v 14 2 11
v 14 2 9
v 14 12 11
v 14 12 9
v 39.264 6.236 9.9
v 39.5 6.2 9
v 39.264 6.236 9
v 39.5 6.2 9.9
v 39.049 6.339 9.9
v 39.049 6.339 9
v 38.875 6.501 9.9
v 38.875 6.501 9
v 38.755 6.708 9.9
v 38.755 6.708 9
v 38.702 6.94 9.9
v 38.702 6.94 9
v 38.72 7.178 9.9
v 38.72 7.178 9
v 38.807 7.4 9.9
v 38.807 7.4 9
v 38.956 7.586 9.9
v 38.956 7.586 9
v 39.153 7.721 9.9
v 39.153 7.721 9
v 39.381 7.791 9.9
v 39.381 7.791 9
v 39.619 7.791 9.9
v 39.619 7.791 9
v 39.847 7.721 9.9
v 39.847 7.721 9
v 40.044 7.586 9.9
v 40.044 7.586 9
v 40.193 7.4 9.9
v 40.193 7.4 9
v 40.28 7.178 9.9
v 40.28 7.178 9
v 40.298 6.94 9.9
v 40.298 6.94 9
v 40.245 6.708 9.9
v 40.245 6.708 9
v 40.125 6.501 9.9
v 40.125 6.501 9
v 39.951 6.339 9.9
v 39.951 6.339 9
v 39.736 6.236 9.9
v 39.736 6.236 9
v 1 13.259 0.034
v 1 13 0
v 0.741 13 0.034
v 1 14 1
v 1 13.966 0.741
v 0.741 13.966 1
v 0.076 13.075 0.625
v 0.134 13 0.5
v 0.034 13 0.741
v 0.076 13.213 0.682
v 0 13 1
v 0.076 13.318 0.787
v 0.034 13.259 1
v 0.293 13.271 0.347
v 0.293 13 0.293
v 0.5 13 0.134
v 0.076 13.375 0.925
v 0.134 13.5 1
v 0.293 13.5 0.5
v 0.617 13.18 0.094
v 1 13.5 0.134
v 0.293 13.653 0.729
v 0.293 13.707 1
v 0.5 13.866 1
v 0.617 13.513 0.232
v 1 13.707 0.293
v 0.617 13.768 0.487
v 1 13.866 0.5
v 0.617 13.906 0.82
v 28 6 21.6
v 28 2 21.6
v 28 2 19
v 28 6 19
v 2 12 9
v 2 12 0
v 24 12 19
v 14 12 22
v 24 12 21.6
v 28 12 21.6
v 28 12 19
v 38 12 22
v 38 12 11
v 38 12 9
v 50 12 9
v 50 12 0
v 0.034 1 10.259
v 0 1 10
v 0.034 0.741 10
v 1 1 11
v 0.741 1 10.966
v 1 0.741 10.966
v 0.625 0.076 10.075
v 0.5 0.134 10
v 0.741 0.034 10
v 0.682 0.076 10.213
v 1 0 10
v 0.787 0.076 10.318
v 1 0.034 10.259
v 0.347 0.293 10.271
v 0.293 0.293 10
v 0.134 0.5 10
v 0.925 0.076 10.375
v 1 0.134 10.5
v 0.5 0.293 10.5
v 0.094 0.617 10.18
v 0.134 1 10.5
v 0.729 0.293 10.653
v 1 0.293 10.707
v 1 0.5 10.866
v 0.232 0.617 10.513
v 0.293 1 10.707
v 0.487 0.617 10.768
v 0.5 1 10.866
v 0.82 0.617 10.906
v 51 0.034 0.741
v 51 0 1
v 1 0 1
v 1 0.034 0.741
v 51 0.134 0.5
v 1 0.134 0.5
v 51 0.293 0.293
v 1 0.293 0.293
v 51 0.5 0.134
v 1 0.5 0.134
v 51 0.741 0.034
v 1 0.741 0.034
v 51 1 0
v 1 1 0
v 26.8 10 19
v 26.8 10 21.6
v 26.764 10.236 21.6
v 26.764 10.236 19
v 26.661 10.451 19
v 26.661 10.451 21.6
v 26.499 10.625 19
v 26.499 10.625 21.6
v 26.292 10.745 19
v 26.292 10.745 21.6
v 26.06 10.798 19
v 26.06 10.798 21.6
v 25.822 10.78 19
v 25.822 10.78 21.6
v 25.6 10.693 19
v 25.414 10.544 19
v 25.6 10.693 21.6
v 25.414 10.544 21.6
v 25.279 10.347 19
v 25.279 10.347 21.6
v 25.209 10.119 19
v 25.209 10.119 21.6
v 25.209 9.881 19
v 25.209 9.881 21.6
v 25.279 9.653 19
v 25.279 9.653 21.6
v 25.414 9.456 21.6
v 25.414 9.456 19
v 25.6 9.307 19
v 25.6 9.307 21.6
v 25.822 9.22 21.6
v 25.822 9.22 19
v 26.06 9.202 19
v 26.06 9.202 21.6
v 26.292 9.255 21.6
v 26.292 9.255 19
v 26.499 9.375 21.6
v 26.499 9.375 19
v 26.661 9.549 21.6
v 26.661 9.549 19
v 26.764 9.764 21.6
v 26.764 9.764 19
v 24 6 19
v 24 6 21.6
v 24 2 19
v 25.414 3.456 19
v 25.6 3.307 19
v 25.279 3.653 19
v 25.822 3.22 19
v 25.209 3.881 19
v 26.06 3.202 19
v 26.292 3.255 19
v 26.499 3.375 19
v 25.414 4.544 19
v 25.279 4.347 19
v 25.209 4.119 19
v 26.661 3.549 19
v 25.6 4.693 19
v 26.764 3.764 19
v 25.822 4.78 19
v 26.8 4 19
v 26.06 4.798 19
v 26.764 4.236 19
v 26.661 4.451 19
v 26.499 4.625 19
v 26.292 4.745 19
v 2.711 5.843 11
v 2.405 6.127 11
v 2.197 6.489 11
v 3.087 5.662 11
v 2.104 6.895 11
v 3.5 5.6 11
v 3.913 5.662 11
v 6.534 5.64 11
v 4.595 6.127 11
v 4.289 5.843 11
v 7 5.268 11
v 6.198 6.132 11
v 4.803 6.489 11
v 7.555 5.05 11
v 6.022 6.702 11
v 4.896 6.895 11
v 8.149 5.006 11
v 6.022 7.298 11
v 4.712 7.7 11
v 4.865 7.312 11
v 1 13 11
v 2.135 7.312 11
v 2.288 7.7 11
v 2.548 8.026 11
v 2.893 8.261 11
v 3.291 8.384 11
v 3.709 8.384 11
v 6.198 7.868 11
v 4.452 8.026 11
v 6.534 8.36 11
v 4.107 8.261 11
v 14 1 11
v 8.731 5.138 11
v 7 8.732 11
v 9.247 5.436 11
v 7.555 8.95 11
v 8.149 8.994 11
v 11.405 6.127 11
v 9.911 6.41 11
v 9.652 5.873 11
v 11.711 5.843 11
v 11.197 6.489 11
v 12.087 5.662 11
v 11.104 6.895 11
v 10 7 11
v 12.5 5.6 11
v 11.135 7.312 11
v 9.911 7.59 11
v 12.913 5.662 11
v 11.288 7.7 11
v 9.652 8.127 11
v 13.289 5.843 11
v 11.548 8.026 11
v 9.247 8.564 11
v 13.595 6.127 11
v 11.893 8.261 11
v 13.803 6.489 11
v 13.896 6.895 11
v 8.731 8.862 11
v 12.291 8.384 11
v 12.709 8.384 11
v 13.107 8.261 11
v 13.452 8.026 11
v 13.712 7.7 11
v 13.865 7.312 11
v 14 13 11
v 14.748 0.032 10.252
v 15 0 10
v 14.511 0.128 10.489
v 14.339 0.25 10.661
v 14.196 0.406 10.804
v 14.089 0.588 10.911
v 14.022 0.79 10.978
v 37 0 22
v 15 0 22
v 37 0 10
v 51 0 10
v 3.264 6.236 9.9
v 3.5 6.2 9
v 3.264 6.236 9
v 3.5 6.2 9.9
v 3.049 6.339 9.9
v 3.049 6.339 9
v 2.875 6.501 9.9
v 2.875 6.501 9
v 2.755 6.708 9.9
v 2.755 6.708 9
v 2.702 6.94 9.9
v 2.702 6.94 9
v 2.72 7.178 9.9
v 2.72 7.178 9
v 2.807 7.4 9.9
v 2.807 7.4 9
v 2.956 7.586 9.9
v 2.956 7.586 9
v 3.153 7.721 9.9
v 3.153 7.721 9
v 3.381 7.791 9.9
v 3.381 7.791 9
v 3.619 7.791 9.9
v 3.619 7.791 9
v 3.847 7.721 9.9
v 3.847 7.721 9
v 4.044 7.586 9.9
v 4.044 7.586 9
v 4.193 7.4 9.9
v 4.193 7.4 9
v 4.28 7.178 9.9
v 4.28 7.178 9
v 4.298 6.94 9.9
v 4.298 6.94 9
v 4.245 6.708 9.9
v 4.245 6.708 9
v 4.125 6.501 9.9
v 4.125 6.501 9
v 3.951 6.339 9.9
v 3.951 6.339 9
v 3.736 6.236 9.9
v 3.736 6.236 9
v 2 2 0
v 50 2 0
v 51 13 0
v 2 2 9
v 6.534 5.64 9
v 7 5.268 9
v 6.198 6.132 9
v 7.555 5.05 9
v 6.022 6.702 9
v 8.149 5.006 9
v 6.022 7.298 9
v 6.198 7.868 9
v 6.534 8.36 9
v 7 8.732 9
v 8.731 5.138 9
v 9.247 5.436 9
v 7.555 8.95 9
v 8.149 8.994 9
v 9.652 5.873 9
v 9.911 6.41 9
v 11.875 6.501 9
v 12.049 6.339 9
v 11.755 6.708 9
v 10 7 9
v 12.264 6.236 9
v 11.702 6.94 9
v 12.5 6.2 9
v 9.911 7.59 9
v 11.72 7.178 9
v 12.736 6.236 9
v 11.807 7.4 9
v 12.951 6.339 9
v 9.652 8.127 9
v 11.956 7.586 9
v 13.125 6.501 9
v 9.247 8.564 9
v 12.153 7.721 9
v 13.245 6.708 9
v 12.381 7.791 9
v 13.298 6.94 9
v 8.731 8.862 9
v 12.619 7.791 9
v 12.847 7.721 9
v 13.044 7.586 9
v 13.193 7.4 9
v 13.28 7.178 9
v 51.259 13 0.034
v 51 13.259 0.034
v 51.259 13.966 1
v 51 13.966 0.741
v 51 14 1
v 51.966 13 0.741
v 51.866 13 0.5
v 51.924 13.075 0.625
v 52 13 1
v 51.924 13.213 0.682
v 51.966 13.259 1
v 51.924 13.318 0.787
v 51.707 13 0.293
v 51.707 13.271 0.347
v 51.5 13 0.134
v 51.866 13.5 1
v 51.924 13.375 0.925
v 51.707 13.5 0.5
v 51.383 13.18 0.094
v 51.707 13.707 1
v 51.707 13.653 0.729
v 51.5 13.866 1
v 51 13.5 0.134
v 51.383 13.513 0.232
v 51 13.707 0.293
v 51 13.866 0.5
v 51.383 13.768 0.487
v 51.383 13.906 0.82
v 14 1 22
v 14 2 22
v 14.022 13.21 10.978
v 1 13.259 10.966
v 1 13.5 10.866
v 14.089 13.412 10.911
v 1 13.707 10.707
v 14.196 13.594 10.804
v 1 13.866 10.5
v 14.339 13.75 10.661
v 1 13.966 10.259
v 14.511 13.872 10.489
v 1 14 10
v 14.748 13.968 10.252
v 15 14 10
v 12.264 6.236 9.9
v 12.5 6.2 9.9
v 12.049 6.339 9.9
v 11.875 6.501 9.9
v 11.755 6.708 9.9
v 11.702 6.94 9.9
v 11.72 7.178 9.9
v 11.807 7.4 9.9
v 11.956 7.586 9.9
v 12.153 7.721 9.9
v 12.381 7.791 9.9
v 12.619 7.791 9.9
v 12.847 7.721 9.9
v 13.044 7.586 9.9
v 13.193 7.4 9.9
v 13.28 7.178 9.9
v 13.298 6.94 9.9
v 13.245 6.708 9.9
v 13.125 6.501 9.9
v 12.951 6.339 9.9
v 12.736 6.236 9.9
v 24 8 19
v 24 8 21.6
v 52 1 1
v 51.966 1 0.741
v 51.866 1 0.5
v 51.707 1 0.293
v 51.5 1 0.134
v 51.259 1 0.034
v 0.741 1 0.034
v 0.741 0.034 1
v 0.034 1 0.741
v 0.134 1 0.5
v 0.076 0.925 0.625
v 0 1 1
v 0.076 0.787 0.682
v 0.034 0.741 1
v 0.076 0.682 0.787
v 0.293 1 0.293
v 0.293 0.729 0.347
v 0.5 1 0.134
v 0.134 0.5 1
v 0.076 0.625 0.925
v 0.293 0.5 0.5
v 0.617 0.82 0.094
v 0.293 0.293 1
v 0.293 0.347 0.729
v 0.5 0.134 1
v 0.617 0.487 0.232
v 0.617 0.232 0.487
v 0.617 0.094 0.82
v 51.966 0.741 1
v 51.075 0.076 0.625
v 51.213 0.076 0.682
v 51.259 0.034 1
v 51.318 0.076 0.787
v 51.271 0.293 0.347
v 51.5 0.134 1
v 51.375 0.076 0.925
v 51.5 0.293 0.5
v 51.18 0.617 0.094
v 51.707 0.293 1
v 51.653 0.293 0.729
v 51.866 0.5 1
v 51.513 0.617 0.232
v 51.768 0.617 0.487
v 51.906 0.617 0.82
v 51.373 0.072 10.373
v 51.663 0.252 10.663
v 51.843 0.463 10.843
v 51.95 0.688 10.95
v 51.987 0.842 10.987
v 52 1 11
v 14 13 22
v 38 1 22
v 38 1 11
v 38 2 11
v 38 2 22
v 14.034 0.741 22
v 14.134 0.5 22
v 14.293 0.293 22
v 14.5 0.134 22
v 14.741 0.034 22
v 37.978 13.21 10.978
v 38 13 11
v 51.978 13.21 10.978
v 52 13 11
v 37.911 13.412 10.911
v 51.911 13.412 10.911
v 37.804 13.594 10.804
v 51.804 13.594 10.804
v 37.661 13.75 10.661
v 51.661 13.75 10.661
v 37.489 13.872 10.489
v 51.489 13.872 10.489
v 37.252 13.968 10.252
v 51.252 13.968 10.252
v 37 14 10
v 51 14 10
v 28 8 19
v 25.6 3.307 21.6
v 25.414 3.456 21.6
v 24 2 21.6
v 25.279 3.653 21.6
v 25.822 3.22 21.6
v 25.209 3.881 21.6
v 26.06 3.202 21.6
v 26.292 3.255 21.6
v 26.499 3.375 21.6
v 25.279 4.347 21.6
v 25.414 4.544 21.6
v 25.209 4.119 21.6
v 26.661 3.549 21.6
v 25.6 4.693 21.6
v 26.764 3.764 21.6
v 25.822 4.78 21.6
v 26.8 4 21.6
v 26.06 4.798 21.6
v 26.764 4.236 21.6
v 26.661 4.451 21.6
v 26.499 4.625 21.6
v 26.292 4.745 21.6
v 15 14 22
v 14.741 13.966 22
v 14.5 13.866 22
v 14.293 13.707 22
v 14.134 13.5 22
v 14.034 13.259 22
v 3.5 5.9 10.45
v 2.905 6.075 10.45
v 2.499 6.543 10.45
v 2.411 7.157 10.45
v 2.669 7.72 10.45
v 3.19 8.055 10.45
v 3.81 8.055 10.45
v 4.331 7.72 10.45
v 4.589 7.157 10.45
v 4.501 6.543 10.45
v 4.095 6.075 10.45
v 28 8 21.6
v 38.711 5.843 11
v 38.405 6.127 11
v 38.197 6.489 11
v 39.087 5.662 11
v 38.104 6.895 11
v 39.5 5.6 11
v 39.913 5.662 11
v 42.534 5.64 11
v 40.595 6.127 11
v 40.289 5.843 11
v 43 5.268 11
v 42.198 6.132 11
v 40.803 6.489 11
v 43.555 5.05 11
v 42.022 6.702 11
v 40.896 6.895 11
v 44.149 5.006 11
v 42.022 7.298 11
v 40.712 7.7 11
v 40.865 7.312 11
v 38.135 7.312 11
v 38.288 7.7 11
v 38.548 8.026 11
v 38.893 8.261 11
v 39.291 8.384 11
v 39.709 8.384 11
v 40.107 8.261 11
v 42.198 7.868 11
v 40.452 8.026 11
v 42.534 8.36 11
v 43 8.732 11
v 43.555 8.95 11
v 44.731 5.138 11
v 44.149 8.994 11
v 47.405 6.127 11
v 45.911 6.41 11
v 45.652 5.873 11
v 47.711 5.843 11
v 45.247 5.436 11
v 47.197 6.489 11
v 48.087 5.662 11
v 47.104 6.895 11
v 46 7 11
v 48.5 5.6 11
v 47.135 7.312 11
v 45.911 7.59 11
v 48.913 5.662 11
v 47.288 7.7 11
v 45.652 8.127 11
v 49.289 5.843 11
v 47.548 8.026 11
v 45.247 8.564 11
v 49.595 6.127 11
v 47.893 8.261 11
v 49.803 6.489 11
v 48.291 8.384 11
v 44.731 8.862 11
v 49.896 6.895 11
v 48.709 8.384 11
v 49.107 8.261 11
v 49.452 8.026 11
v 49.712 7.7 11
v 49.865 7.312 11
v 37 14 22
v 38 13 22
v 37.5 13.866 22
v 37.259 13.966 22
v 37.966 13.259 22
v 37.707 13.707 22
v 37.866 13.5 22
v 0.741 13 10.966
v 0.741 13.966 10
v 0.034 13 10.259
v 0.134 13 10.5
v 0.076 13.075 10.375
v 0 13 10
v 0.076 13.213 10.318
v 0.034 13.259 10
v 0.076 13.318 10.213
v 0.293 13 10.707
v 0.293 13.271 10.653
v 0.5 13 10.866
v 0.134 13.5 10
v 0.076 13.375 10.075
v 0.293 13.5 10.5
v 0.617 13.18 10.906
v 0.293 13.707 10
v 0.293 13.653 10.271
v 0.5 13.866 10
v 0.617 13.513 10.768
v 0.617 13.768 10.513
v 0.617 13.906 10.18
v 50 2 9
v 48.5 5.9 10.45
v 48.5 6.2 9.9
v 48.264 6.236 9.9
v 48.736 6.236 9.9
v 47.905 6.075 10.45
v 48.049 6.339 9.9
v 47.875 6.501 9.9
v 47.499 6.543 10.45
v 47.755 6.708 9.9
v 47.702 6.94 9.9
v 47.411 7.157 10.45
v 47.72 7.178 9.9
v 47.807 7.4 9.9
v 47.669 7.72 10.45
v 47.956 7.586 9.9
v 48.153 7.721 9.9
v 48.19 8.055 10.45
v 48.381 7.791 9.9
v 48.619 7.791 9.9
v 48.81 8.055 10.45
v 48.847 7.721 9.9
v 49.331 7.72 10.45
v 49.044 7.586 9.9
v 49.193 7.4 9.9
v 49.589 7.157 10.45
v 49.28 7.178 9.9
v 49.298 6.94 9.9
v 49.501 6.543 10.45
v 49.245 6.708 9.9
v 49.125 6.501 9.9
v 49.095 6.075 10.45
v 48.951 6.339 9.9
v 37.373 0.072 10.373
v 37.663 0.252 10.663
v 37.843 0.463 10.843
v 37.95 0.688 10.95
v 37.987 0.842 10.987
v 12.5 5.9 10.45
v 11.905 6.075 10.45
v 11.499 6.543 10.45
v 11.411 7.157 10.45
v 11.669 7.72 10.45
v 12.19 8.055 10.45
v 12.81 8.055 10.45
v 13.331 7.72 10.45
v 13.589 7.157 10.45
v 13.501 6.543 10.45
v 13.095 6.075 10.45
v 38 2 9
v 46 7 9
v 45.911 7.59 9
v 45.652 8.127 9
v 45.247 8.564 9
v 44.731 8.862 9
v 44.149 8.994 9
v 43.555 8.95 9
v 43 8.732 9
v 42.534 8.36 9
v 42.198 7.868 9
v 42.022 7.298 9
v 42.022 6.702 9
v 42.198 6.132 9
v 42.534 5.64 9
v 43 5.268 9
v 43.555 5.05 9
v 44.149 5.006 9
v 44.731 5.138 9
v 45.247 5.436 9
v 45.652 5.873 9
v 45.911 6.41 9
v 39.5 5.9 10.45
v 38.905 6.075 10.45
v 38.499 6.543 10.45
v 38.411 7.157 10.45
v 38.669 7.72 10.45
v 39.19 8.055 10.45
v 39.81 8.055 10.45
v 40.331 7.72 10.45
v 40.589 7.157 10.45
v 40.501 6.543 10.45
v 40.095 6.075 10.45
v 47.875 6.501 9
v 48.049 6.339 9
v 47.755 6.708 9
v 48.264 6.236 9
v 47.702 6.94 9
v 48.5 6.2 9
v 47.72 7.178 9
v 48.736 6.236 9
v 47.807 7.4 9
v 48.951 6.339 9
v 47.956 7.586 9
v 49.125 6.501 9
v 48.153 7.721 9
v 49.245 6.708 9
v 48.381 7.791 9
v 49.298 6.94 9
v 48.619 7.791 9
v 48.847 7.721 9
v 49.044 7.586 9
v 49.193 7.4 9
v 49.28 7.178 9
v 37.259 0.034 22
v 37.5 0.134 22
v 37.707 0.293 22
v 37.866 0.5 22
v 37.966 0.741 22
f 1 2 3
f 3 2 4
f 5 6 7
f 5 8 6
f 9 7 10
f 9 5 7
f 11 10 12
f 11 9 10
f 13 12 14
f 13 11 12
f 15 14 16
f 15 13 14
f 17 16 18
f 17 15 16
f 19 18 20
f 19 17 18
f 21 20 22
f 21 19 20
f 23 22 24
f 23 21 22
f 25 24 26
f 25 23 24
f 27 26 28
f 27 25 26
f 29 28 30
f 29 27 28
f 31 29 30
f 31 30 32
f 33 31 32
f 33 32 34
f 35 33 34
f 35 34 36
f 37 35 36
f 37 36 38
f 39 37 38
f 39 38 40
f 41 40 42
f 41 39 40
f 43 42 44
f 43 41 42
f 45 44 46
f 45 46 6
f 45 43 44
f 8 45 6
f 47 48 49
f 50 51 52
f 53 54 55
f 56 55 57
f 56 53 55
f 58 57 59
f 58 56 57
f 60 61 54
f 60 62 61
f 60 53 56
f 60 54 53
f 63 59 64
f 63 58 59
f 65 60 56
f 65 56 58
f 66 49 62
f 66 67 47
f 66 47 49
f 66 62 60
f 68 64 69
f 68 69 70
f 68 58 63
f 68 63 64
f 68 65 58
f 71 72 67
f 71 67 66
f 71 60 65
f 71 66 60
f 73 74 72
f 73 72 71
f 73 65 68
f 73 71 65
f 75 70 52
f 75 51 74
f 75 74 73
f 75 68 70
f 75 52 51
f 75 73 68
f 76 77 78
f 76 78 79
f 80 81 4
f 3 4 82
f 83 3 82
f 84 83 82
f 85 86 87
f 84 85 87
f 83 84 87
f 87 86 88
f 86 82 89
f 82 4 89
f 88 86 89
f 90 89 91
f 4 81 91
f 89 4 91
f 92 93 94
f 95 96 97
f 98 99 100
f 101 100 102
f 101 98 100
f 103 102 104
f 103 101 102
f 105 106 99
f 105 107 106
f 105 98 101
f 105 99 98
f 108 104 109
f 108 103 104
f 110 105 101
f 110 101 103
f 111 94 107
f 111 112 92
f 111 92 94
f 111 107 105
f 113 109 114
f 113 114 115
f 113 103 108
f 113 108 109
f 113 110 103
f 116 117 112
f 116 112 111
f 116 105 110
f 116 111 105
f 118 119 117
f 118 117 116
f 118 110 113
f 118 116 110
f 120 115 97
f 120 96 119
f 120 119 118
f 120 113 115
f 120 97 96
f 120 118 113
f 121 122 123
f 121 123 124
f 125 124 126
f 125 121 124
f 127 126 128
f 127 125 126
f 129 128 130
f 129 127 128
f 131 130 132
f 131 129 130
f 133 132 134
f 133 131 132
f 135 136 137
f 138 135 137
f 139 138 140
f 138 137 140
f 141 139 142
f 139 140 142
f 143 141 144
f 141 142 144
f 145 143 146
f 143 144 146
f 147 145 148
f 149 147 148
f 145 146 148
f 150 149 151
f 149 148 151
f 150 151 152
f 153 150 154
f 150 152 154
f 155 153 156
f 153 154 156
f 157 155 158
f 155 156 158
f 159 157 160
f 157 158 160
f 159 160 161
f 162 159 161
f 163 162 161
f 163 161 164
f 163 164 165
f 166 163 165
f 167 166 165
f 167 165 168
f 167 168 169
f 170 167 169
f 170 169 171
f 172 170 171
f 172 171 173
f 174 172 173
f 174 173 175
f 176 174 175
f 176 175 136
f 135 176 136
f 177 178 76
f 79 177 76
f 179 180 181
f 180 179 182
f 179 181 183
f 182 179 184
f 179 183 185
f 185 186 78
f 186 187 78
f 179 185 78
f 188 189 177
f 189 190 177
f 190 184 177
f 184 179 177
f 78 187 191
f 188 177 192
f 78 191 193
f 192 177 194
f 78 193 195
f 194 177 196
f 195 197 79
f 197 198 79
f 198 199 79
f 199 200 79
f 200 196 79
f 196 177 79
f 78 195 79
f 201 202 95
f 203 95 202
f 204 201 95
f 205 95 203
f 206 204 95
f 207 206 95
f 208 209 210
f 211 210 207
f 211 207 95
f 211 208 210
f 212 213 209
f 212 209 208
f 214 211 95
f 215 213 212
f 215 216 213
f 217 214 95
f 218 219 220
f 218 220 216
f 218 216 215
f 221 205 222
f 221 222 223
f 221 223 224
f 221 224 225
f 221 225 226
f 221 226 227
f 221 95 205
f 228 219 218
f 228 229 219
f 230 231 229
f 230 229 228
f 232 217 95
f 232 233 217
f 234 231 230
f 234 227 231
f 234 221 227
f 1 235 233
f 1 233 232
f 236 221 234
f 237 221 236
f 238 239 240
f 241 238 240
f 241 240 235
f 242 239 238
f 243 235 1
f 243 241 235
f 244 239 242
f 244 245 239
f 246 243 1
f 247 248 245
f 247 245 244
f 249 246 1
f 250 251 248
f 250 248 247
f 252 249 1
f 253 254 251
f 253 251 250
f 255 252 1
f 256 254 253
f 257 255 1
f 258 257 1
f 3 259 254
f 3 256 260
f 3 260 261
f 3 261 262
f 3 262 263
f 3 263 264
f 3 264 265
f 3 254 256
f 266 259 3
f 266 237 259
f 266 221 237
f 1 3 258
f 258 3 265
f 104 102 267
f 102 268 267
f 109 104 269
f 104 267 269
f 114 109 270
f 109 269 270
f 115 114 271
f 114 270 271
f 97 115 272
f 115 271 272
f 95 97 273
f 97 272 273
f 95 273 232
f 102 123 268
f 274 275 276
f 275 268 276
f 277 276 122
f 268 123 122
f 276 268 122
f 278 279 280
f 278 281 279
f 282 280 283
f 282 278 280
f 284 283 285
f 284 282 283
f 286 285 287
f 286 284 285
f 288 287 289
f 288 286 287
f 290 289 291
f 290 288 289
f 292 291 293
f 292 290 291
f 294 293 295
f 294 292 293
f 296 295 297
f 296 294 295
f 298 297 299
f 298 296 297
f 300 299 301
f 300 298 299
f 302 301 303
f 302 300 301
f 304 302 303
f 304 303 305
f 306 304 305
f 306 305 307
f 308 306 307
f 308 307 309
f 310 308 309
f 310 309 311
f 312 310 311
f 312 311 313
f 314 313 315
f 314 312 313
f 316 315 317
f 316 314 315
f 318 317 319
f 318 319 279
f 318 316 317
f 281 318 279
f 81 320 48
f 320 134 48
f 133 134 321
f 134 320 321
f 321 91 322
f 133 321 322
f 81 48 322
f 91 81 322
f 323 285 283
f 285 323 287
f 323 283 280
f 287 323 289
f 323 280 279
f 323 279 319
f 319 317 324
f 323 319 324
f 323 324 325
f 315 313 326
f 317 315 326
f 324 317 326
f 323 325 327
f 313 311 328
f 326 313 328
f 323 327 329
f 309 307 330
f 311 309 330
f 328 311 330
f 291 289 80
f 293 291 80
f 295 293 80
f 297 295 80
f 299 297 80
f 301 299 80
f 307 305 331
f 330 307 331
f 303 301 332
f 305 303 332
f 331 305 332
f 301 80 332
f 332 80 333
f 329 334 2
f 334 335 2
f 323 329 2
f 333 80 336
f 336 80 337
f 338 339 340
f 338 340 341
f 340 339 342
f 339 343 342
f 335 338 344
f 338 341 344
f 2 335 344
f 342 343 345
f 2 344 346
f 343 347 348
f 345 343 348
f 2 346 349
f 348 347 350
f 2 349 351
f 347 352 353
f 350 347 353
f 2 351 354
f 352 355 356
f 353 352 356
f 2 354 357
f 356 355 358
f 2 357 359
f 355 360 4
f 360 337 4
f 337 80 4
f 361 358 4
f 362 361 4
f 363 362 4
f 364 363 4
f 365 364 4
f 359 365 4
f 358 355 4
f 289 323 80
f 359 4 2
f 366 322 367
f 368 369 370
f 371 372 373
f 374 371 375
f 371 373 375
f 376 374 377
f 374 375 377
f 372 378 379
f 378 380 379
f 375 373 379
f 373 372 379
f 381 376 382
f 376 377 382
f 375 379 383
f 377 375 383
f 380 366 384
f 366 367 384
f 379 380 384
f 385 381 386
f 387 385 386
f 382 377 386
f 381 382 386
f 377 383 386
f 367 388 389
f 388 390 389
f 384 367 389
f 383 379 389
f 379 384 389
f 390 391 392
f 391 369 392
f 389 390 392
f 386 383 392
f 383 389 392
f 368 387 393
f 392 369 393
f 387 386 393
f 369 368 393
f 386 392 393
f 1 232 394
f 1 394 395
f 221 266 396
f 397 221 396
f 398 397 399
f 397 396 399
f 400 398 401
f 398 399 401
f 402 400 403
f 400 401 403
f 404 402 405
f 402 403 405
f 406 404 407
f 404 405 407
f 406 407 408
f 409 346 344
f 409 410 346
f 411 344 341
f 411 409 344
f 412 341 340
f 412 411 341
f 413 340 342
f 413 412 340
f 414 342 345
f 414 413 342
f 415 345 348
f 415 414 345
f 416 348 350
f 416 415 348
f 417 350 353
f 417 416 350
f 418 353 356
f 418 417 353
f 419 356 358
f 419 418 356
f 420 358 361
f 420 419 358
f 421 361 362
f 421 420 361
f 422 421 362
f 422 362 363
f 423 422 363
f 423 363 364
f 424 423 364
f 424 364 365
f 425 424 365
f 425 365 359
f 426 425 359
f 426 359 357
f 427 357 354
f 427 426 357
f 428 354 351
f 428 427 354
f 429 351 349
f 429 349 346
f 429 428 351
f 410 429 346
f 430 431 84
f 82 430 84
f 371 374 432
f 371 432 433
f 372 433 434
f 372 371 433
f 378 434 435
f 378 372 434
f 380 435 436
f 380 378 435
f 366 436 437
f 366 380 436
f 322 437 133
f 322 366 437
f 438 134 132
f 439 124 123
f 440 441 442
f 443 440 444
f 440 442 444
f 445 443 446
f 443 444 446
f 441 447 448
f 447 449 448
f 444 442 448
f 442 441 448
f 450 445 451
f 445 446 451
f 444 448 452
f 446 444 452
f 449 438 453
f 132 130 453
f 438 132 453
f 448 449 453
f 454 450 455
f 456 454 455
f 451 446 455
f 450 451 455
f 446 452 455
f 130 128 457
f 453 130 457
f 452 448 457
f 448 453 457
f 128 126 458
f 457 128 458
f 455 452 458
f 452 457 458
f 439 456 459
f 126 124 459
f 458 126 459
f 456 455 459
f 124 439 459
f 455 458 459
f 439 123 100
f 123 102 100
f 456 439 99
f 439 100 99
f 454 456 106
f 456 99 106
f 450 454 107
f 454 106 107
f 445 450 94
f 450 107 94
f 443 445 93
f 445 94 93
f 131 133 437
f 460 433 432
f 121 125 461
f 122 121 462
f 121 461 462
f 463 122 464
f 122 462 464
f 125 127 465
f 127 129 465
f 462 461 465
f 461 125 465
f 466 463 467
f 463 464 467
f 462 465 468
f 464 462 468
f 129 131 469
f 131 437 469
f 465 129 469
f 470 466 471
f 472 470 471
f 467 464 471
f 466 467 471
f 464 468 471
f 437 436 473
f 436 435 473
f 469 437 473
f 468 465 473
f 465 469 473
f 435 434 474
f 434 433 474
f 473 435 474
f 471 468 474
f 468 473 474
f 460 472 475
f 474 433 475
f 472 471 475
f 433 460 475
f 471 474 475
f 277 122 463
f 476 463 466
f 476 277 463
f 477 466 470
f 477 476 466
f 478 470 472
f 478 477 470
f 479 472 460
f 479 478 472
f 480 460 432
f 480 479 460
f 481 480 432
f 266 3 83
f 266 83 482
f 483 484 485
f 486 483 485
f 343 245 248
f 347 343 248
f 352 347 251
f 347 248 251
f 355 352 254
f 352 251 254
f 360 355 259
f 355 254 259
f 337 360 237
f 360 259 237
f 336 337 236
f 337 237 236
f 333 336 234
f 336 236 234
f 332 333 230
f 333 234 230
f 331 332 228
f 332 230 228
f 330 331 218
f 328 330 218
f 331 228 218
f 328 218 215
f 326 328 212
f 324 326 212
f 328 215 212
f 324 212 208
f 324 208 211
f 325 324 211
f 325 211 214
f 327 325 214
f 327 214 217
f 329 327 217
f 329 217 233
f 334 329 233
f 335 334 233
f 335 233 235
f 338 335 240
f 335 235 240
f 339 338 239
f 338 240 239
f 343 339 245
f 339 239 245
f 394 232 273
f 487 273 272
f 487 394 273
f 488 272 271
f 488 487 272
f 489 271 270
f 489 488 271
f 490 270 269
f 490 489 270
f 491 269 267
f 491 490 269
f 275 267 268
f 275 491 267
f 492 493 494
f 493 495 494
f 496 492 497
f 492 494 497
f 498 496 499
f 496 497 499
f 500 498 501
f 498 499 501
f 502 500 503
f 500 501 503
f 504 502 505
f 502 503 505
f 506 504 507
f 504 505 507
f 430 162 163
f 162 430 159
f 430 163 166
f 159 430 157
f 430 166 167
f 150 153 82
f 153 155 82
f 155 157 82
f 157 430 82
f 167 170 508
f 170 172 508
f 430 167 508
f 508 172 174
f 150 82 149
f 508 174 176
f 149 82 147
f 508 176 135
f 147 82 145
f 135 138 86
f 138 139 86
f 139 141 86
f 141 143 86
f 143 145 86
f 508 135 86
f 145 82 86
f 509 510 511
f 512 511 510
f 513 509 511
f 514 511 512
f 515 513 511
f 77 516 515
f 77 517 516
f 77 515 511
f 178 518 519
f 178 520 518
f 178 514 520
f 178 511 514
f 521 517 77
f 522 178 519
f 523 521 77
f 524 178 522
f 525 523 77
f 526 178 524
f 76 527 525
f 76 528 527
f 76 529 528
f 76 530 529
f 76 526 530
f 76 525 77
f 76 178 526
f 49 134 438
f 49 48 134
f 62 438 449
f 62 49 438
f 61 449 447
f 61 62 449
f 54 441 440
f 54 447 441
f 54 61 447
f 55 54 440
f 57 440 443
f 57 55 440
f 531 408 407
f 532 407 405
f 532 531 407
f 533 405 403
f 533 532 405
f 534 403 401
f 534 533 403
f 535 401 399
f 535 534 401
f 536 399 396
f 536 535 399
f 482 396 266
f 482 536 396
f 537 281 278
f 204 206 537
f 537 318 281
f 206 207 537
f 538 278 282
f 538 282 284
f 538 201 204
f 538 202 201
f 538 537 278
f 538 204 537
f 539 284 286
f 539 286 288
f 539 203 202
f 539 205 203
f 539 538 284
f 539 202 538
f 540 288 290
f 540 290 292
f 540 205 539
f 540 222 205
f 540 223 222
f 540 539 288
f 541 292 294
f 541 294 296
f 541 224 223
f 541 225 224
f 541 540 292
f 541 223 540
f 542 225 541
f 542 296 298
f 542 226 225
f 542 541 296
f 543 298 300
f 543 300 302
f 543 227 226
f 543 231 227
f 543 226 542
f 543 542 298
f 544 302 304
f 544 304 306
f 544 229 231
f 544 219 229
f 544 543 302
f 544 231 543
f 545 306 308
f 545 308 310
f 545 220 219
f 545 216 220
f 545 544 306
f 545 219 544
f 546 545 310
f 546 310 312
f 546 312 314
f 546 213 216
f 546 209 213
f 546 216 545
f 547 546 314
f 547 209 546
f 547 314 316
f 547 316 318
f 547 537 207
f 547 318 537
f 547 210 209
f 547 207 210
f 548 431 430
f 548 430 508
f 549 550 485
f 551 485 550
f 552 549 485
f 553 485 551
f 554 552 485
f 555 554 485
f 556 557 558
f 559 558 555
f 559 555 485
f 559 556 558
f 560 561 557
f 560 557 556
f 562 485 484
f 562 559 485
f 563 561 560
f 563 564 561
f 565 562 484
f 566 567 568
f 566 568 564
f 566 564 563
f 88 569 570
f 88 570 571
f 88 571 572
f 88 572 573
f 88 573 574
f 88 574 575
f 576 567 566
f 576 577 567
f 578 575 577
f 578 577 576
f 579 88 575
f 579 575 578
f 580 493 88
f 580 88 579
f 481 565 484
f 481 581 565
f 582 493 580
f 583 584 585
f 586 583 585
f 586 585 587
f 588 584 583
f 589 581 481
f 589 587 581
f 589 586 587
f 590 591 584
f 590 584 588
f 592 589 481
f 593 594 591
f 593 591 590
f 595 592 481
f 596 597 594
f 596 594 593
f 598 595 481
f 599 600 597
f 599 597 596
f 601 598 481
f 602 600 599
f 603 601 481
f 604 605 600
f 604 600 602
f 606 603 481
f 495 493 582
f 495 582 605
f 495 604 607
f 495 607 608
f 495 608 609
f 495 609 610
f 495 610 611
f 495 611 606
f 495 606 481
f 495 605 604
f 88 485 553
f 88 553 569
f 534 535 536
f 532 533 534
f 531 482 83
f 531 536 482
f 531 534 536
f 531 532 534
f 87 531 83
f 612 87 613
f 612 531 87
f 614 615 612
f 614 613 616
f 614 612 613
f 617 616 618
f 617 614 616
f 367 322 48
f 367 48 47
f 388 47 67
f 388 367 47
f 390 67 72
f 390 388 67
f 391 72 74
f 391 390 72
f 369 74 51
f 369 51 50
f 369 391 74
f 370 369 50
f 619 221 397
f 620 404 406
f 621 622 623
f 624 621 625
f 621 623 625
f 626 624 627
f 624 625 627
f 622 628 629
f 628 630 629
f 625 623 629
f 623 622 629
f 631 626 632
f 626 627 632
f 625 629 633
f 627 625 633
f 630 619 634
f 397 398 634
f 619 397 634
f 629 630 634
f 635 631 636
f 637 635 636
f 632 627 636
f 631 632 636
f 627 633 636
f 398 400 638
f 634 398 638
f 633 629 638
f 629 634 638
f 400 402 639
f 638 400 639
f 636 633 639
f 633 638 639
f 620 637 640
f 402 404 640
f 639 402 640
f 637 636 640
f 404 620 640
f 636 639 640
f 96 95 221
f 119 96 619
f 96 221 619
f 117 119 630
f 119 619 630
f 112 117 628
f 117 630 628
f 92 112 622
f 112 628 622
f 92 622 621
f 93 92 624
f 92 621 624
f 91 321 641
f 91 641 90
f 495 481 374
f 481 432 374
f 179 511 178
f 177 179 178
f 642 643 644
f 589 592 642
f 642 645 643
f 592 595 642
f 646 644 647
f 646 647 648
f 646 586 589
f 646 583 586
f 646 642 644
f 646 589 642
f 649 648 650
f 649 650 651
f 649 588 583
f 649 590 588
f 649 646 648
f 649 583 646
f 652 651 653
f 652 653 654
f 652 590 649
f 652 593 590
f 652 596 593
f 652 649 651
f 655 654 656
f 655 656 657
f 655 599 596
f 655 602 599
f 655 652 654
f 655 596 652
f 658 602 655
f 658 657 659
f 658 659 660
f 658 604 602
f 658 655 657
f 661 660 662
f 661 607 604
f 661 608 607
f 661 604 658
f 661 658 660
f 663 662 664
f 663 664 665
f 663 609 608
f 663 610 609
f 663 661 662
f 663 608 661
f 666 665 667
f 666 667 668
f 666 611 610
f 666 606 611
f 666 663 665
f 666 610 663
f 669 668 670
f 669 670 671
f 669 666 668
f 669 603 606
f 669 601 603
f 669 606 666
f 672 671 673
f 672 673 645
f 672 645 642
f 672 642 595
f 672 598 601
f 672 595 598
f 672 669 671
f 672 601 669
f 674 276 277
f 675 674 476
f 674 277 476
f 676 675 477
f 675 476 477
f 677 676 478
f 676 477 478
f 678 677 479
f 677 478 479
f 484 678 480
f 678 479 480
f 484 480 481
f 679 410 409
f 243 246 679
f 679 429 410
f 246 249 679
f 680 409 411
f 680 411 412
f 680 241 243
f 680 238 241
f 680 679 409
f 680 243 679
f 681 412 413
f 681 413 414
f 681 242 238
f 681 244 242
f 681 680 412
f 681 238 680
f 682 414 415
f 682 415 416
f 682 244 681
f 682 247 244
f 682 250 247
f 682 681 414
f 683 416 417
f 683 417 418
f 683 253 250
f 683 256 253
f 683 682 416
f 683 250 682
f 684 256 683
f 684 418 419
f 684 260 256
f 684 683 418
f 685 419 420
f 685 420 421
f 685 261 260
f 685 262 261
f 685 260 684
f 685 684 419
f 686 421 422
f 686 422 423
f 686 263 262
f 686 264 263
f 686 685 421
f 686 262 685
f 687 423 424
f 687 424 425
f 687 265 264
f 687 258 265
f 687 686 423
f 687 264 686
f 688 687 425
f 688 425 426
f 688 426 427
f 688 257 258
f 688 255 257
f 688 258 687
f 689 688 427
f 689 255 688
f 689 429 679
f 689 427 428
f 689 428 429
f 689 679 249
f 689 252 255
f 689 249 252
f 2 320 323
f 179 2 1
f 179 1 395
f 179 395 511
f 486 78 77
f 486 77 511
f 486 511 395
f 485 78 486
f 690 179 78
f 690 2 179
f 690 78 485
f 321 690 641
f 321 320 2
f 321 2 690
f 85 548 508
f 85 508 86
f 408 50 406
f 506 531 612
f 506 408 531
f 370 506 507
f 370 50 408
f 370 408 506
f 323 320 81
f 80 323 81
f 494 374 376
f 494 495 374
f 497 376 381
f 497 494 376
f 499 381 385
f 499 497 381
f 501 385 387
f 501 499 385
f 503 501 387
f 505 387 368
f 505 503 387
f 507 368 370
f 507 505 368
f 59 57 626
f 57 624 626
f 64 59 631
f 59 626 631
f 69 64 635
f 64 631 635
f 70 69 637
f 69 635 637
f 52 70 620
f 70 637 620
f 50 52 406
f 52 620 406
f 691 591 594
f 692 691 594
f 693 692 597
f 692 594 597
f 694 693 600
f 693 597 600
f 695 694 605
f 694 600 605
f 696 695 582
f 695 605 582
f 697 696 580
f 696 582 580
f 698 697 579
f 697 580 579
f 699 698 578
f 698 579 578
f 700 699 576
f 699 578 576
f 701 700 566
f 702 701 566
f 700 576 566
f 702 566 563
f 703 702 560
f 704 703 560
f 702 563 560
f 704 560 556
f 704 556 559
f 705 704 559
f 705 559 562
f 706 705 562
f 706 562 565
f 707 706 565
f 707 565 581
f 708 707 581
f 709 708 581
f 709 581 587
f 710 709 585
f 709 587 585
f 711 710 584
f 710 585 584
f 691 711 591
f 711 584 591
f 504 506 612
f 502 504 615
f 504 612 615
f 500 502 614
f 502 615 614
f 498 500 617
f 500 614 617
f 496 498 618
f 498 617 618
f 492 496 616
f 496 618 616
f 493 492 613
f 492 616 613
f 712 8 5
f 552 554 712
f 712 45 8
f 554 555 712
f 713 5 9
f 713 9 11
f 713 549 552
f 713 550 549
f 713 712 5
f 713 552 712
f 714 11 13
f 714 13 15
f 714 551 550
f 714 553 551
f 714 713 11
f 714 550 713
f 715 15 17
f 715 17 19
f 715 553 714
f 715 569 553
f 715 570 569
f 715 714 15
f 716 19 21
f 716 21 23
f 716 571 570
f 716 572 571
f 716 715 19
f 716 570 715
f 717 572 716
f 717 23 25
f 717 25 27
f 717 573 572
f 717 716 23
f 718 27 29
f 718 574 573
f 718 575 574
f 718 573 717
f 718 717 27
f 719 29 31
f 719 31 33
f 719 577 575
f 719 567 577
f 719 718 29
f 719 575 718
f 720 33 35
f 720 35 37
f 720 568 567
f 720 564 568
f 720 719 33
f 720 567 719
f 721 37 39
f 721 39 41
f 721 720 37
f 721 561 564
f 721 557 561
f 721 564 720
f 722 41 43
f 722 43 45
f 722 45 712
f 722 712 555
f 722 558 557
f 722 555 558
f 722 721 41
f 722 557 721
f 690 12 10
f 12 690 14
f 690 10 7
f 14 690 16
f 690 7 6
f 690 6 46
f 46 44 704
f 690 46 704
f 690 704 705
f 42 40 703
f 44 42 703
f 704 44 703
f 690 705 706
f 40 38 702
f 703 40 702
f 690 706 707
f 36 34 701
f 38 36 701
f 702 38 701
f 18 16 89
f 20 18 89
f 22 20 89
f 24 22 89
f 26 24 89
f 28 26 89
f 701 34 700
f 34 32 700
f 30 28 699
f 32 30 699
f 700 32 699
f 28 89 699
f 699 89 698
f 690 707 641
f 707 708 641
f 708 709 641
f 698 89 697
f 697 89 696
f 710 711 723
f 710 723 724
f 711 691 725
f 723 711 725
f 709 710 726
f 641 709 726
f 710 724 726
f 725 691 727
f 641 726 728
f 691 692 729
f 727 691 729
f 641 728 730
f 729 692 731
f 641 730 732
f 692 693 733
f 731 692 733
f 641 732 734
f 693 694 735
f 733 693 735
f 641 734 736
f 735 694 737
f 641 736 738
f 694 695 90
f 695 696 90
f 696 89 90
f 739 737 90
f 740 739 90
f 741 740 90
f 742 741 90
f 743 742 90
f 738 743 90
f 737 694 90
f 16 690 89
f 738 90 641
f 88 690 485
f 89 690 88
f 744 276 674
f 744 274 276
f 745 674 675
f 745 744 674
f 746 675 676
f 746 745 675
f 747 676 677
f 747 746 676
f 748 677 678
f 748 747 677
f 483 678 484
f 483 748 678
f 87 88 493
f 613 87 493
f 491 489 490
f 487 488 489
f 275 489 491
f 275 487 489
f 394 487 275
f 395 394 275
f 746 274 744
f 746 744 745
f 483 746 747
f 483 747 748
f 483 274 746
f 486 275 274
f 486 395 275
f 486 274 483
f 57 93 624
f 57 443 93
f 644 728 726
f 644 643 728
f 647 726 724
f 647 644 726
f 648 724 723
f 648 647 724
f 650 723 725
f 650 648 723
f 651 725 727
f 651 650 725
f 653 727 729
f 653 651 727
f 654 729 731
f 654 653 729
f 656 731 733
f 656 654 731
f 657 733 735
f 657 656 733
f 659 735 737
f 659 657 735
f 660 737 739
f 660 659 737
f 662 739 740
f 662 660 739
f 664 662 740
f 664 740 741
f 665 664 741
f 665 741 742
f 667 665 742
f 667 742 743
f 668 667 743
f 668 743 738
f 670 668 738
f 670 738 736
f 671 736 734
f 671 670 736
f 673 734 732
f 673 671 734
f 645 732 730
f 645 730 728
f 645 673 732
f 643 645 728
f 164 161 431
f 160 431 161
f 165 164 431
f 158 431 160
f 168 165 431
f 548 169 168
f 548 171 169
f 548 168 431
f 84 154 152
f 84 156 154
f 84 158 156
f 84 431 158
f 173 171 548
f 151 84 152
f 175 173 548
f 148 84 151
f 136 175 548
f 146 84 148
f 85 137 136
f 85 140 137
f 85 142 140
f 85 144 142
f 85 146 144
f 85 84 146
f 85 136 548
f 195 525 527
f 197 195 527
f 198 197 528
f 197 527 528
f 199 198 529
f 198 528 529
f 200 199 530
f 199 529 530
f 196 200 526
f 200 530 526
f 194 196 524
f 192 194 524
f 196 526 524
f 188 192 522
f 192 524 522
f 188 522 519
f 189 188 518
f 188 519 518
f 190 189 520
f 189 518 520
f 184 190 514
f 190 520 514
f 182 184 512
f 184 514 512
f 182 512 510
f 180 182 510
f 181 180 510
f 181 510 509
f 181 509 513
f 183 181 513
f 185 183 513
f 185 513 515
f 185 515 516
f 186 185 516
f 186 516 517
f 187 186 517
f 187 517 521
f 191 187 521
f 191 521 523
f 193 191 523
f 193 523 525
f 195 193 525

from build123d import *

# Parameters (mm, degrees)
SKETCH_1_W          = 52
SKETCH_1_H          = 14
EXTRUDE_1_DEPTH     = 11
SHELL_1_T           = -2
SKETCH_2_W          = 24
SKETCH_2_H          = 10
CUT_EXTRUDE_1_DEPTH = 2
SKETCH_3_W          = 24
SKETCH_3_H          = 2
EXTRUDE_2_DEPTH     = 11
SKETCH_8_R          = 2
CUT_EXTRUDE_5_DEPTH = 2
FILLET_1_R          = 1
SKETCH_15_W         = 4
SKETCH_15_H         = 4
EXTRUDE_4_DEPTH     = 3
SKETCH_16_R         = 0.8
CUT_EXTRUDE_7_DEPTH = 3
SKETCH_17_W         = 24
SKETCH_17_H         = 10
CUT_EXTRUDE_8_DEPTH = 0.4


with BuildPart() as part:
    # 草图1 → 凸台-拉伸1 (new body)
    with BuildSketch(Plane.XY):
        with Locations((26, 7)):
            Rectangle(SKETCH_1_W, SKETCH_1_H)
    extrude(amount=EXTRUDE_1_DEPTH)

    # 抽壳1
    shell_1_openings = [part.faces().sort_by_distance(p)[0] for p in [
        (26, 7, 0),
    ]]
    offset(amount=SHELL_1_T, openings=shell_1_openings, kind=Kind.INTERSECTION)

    # 草图2 → 切除-拉伸1 (cut)
    with BuildSketch(Plane(origin=(0, 0, 9), x_dir=(-1, 0, 0), z_dir=(0, 0, -1))):
        with Locations((-26, 7)):
            Rectangle(SKETCH_2_W, SKETCH_2_H)
    extrude(amount=-CUT_EXTRUDE_1_DEPTH, mode=Mode.SUBTRACT)

    # 草图3 → 凸台-拉伸2 (add)
    with BuildSketch(Plane.XY.offset(11)):
        with Locations((26, 1)):
            Rectangle(SKETCH_3_W, SKETCH_3_H)
        with Locations((26, 13)):
            Rectangle(SKETCH_3_W, SKETCH_3_H)
    extrude(amount=EXTRUDE_2_DEPTH)

    # 草图8 → 切除-拉伸5 (cut)
    with BuildSketch(Plane.XY.offset(11)):
        with Locations((8, 7)):
            Circle(SKETCH_8_R)
        with Locations((44, 7)):
            Circle(SKETCH_8_R)
    extrude(amount=-CUT_EXTRUDE_5_DEPTH, mode=Mode.SUBTRACT)

    # 圆角1
    fillet_1_edges = [part.edges().sort_by_distance(p)[0] for p in [
        (45, 14, 11),
        (45, 0, 11),
        (7, 14, 11),
        (38, 0, 16.5),
        (14, 0, 16.5),
        (0, 7, 11),
        (26, 14, 0),
        (14, 14, 16.5),
        (38, 14, 16.5),
        (52, 7, 0),
        (26, 0, 0),
        (0, 7, 0),
        (0, 14, 5.5),
        (52, 14, 5.5),
        (52, 0, 5.5),
        (0, 0, 5.5),
        (7, 0, 11),
    ]]
    fillet(fillet_1_edges, radius=FILLET_1_R)

    # 草图15 → 凸台-拉伸4 (add)
    with BuildSketch(Plane.XY.offset(22)):
        with Locations((26, 4)):
            Rectangle(SKETCH_15_W, SKETCH_15_H)
        with Locations((26, 10)):
            Rectangle(SKETCH_15_W, SKETCH_15_H)
    extrude(amount=-EXTRUDE_4_DEPTH)

    # 草图16 → 切除-拉伸7 (cut)
    with BuildSketch(Plane.XY.offset(22)):
        with Locations((26, 10)):
            Circle(SKETCH_16_R)
        with Locations((26, 4)):
            Circle(SKETCH_16_R)
    extrude(amount=-CUT_EXTRUDE_7_DEPTH, mode=Mode.SUBTRACT)

    # 草图19 → 切除-旋转6 (revolve, cut)
    with BuildSketch(Plane(origin=(0, 7, 0), x_dir=(1, 0, 0), z_dir=(0, 1, 0)), mode=Mode.PRIVATE) as cut_revolve_6_sk:
        Polygon((2.1, -11), (3.5, -11), (3.5, -9), (2.7, -9), (2.7, -9.9), align=None)
    revolve(cut_revolve_6_sk.sketch.rotate(Axis((3.5, 7, 11), (0, 0, -1)), 270), axis=Axis((3.5, 7, 11), (0, 0, -1)), mode=Mode.SUBTRACT)

    # 草图20 → 切除-旋转7 (revolve, cut)
    with BuildSketch(Plane(origin=(0, 7, 0), x_dir=(1, 0, 0), z_dir=(0, 1, 0)), mode=Mode.PRIVATE) as cut_revolve_7_sk:
        Polygon((11.1, -11), (12.5, -11), (12.5, -9), (11.7, -9), (11.7, -9.9), align=None)
    revolve(cut_revolve_7_sk.sketch.rotate(Axis((12.5, 7, 11), (0, 0, -1)), 270), axis=Axis((12.5, 7, 11), (0, 0, -1)), mode=Mode.SUBTRACT)

    # 草图21 → 切除-旋转8 (revolve, cut)
    with BuildSketch(Plane(origin=(0, 7, 0), x_dir=(1, 0, 0), z_dir=(0, 1, 0)), mode=Mode.PRIVATE) as cut_revolve_8_sk:
        Polygon((38.1, -11), (39.5, -11), (39.5, -9), (38.7, -9), (38.7, -9.9), align=None)
    revolve(cut_revolve_8_sk.sketch.rotate(Axis((39.5, 7, 11), (0, 0, -1)), 270), axis=Axis((39.5, 7, 11), (0, 0, -1)), mode=Mode.SUBTRACT)

    # 草图22 → 切除-旋转9 (revolve, cut)
    with BuildSketch(Plane(origin=(0, 7, 0), x_dir=(1, 0, 0), z_dir=(0, 1, 0)), mode=Mode.PRIVATE) as cut_revolve_9_sk:
        Polygon((47.1, -11), (48.5, -11), (48.5, -9), (47.7, -9), (47.7, -9.9), align=None)
    revolve(cut_revolve_9_sk.sketch.rotate(Axis((48.5, 7, 11), (0, 0, -1)), 270), axis=Axis((48.5, 7, 11), (0, 0, -1)), mode=Mode.SUBTRACT)

    # 草图17 → 切除-拉伸8 (cut)
    with BuildSketch(Plane.XY.offset(22)):
        with Locations((26, 7)):
            Rectangle(SKETCH_17_W, SKETCH_17_H)
    extrude(amount=-CUT_EXTRUDE_8_DEPTH, mode=Mode.SUBTRACT)


solid = part.part
